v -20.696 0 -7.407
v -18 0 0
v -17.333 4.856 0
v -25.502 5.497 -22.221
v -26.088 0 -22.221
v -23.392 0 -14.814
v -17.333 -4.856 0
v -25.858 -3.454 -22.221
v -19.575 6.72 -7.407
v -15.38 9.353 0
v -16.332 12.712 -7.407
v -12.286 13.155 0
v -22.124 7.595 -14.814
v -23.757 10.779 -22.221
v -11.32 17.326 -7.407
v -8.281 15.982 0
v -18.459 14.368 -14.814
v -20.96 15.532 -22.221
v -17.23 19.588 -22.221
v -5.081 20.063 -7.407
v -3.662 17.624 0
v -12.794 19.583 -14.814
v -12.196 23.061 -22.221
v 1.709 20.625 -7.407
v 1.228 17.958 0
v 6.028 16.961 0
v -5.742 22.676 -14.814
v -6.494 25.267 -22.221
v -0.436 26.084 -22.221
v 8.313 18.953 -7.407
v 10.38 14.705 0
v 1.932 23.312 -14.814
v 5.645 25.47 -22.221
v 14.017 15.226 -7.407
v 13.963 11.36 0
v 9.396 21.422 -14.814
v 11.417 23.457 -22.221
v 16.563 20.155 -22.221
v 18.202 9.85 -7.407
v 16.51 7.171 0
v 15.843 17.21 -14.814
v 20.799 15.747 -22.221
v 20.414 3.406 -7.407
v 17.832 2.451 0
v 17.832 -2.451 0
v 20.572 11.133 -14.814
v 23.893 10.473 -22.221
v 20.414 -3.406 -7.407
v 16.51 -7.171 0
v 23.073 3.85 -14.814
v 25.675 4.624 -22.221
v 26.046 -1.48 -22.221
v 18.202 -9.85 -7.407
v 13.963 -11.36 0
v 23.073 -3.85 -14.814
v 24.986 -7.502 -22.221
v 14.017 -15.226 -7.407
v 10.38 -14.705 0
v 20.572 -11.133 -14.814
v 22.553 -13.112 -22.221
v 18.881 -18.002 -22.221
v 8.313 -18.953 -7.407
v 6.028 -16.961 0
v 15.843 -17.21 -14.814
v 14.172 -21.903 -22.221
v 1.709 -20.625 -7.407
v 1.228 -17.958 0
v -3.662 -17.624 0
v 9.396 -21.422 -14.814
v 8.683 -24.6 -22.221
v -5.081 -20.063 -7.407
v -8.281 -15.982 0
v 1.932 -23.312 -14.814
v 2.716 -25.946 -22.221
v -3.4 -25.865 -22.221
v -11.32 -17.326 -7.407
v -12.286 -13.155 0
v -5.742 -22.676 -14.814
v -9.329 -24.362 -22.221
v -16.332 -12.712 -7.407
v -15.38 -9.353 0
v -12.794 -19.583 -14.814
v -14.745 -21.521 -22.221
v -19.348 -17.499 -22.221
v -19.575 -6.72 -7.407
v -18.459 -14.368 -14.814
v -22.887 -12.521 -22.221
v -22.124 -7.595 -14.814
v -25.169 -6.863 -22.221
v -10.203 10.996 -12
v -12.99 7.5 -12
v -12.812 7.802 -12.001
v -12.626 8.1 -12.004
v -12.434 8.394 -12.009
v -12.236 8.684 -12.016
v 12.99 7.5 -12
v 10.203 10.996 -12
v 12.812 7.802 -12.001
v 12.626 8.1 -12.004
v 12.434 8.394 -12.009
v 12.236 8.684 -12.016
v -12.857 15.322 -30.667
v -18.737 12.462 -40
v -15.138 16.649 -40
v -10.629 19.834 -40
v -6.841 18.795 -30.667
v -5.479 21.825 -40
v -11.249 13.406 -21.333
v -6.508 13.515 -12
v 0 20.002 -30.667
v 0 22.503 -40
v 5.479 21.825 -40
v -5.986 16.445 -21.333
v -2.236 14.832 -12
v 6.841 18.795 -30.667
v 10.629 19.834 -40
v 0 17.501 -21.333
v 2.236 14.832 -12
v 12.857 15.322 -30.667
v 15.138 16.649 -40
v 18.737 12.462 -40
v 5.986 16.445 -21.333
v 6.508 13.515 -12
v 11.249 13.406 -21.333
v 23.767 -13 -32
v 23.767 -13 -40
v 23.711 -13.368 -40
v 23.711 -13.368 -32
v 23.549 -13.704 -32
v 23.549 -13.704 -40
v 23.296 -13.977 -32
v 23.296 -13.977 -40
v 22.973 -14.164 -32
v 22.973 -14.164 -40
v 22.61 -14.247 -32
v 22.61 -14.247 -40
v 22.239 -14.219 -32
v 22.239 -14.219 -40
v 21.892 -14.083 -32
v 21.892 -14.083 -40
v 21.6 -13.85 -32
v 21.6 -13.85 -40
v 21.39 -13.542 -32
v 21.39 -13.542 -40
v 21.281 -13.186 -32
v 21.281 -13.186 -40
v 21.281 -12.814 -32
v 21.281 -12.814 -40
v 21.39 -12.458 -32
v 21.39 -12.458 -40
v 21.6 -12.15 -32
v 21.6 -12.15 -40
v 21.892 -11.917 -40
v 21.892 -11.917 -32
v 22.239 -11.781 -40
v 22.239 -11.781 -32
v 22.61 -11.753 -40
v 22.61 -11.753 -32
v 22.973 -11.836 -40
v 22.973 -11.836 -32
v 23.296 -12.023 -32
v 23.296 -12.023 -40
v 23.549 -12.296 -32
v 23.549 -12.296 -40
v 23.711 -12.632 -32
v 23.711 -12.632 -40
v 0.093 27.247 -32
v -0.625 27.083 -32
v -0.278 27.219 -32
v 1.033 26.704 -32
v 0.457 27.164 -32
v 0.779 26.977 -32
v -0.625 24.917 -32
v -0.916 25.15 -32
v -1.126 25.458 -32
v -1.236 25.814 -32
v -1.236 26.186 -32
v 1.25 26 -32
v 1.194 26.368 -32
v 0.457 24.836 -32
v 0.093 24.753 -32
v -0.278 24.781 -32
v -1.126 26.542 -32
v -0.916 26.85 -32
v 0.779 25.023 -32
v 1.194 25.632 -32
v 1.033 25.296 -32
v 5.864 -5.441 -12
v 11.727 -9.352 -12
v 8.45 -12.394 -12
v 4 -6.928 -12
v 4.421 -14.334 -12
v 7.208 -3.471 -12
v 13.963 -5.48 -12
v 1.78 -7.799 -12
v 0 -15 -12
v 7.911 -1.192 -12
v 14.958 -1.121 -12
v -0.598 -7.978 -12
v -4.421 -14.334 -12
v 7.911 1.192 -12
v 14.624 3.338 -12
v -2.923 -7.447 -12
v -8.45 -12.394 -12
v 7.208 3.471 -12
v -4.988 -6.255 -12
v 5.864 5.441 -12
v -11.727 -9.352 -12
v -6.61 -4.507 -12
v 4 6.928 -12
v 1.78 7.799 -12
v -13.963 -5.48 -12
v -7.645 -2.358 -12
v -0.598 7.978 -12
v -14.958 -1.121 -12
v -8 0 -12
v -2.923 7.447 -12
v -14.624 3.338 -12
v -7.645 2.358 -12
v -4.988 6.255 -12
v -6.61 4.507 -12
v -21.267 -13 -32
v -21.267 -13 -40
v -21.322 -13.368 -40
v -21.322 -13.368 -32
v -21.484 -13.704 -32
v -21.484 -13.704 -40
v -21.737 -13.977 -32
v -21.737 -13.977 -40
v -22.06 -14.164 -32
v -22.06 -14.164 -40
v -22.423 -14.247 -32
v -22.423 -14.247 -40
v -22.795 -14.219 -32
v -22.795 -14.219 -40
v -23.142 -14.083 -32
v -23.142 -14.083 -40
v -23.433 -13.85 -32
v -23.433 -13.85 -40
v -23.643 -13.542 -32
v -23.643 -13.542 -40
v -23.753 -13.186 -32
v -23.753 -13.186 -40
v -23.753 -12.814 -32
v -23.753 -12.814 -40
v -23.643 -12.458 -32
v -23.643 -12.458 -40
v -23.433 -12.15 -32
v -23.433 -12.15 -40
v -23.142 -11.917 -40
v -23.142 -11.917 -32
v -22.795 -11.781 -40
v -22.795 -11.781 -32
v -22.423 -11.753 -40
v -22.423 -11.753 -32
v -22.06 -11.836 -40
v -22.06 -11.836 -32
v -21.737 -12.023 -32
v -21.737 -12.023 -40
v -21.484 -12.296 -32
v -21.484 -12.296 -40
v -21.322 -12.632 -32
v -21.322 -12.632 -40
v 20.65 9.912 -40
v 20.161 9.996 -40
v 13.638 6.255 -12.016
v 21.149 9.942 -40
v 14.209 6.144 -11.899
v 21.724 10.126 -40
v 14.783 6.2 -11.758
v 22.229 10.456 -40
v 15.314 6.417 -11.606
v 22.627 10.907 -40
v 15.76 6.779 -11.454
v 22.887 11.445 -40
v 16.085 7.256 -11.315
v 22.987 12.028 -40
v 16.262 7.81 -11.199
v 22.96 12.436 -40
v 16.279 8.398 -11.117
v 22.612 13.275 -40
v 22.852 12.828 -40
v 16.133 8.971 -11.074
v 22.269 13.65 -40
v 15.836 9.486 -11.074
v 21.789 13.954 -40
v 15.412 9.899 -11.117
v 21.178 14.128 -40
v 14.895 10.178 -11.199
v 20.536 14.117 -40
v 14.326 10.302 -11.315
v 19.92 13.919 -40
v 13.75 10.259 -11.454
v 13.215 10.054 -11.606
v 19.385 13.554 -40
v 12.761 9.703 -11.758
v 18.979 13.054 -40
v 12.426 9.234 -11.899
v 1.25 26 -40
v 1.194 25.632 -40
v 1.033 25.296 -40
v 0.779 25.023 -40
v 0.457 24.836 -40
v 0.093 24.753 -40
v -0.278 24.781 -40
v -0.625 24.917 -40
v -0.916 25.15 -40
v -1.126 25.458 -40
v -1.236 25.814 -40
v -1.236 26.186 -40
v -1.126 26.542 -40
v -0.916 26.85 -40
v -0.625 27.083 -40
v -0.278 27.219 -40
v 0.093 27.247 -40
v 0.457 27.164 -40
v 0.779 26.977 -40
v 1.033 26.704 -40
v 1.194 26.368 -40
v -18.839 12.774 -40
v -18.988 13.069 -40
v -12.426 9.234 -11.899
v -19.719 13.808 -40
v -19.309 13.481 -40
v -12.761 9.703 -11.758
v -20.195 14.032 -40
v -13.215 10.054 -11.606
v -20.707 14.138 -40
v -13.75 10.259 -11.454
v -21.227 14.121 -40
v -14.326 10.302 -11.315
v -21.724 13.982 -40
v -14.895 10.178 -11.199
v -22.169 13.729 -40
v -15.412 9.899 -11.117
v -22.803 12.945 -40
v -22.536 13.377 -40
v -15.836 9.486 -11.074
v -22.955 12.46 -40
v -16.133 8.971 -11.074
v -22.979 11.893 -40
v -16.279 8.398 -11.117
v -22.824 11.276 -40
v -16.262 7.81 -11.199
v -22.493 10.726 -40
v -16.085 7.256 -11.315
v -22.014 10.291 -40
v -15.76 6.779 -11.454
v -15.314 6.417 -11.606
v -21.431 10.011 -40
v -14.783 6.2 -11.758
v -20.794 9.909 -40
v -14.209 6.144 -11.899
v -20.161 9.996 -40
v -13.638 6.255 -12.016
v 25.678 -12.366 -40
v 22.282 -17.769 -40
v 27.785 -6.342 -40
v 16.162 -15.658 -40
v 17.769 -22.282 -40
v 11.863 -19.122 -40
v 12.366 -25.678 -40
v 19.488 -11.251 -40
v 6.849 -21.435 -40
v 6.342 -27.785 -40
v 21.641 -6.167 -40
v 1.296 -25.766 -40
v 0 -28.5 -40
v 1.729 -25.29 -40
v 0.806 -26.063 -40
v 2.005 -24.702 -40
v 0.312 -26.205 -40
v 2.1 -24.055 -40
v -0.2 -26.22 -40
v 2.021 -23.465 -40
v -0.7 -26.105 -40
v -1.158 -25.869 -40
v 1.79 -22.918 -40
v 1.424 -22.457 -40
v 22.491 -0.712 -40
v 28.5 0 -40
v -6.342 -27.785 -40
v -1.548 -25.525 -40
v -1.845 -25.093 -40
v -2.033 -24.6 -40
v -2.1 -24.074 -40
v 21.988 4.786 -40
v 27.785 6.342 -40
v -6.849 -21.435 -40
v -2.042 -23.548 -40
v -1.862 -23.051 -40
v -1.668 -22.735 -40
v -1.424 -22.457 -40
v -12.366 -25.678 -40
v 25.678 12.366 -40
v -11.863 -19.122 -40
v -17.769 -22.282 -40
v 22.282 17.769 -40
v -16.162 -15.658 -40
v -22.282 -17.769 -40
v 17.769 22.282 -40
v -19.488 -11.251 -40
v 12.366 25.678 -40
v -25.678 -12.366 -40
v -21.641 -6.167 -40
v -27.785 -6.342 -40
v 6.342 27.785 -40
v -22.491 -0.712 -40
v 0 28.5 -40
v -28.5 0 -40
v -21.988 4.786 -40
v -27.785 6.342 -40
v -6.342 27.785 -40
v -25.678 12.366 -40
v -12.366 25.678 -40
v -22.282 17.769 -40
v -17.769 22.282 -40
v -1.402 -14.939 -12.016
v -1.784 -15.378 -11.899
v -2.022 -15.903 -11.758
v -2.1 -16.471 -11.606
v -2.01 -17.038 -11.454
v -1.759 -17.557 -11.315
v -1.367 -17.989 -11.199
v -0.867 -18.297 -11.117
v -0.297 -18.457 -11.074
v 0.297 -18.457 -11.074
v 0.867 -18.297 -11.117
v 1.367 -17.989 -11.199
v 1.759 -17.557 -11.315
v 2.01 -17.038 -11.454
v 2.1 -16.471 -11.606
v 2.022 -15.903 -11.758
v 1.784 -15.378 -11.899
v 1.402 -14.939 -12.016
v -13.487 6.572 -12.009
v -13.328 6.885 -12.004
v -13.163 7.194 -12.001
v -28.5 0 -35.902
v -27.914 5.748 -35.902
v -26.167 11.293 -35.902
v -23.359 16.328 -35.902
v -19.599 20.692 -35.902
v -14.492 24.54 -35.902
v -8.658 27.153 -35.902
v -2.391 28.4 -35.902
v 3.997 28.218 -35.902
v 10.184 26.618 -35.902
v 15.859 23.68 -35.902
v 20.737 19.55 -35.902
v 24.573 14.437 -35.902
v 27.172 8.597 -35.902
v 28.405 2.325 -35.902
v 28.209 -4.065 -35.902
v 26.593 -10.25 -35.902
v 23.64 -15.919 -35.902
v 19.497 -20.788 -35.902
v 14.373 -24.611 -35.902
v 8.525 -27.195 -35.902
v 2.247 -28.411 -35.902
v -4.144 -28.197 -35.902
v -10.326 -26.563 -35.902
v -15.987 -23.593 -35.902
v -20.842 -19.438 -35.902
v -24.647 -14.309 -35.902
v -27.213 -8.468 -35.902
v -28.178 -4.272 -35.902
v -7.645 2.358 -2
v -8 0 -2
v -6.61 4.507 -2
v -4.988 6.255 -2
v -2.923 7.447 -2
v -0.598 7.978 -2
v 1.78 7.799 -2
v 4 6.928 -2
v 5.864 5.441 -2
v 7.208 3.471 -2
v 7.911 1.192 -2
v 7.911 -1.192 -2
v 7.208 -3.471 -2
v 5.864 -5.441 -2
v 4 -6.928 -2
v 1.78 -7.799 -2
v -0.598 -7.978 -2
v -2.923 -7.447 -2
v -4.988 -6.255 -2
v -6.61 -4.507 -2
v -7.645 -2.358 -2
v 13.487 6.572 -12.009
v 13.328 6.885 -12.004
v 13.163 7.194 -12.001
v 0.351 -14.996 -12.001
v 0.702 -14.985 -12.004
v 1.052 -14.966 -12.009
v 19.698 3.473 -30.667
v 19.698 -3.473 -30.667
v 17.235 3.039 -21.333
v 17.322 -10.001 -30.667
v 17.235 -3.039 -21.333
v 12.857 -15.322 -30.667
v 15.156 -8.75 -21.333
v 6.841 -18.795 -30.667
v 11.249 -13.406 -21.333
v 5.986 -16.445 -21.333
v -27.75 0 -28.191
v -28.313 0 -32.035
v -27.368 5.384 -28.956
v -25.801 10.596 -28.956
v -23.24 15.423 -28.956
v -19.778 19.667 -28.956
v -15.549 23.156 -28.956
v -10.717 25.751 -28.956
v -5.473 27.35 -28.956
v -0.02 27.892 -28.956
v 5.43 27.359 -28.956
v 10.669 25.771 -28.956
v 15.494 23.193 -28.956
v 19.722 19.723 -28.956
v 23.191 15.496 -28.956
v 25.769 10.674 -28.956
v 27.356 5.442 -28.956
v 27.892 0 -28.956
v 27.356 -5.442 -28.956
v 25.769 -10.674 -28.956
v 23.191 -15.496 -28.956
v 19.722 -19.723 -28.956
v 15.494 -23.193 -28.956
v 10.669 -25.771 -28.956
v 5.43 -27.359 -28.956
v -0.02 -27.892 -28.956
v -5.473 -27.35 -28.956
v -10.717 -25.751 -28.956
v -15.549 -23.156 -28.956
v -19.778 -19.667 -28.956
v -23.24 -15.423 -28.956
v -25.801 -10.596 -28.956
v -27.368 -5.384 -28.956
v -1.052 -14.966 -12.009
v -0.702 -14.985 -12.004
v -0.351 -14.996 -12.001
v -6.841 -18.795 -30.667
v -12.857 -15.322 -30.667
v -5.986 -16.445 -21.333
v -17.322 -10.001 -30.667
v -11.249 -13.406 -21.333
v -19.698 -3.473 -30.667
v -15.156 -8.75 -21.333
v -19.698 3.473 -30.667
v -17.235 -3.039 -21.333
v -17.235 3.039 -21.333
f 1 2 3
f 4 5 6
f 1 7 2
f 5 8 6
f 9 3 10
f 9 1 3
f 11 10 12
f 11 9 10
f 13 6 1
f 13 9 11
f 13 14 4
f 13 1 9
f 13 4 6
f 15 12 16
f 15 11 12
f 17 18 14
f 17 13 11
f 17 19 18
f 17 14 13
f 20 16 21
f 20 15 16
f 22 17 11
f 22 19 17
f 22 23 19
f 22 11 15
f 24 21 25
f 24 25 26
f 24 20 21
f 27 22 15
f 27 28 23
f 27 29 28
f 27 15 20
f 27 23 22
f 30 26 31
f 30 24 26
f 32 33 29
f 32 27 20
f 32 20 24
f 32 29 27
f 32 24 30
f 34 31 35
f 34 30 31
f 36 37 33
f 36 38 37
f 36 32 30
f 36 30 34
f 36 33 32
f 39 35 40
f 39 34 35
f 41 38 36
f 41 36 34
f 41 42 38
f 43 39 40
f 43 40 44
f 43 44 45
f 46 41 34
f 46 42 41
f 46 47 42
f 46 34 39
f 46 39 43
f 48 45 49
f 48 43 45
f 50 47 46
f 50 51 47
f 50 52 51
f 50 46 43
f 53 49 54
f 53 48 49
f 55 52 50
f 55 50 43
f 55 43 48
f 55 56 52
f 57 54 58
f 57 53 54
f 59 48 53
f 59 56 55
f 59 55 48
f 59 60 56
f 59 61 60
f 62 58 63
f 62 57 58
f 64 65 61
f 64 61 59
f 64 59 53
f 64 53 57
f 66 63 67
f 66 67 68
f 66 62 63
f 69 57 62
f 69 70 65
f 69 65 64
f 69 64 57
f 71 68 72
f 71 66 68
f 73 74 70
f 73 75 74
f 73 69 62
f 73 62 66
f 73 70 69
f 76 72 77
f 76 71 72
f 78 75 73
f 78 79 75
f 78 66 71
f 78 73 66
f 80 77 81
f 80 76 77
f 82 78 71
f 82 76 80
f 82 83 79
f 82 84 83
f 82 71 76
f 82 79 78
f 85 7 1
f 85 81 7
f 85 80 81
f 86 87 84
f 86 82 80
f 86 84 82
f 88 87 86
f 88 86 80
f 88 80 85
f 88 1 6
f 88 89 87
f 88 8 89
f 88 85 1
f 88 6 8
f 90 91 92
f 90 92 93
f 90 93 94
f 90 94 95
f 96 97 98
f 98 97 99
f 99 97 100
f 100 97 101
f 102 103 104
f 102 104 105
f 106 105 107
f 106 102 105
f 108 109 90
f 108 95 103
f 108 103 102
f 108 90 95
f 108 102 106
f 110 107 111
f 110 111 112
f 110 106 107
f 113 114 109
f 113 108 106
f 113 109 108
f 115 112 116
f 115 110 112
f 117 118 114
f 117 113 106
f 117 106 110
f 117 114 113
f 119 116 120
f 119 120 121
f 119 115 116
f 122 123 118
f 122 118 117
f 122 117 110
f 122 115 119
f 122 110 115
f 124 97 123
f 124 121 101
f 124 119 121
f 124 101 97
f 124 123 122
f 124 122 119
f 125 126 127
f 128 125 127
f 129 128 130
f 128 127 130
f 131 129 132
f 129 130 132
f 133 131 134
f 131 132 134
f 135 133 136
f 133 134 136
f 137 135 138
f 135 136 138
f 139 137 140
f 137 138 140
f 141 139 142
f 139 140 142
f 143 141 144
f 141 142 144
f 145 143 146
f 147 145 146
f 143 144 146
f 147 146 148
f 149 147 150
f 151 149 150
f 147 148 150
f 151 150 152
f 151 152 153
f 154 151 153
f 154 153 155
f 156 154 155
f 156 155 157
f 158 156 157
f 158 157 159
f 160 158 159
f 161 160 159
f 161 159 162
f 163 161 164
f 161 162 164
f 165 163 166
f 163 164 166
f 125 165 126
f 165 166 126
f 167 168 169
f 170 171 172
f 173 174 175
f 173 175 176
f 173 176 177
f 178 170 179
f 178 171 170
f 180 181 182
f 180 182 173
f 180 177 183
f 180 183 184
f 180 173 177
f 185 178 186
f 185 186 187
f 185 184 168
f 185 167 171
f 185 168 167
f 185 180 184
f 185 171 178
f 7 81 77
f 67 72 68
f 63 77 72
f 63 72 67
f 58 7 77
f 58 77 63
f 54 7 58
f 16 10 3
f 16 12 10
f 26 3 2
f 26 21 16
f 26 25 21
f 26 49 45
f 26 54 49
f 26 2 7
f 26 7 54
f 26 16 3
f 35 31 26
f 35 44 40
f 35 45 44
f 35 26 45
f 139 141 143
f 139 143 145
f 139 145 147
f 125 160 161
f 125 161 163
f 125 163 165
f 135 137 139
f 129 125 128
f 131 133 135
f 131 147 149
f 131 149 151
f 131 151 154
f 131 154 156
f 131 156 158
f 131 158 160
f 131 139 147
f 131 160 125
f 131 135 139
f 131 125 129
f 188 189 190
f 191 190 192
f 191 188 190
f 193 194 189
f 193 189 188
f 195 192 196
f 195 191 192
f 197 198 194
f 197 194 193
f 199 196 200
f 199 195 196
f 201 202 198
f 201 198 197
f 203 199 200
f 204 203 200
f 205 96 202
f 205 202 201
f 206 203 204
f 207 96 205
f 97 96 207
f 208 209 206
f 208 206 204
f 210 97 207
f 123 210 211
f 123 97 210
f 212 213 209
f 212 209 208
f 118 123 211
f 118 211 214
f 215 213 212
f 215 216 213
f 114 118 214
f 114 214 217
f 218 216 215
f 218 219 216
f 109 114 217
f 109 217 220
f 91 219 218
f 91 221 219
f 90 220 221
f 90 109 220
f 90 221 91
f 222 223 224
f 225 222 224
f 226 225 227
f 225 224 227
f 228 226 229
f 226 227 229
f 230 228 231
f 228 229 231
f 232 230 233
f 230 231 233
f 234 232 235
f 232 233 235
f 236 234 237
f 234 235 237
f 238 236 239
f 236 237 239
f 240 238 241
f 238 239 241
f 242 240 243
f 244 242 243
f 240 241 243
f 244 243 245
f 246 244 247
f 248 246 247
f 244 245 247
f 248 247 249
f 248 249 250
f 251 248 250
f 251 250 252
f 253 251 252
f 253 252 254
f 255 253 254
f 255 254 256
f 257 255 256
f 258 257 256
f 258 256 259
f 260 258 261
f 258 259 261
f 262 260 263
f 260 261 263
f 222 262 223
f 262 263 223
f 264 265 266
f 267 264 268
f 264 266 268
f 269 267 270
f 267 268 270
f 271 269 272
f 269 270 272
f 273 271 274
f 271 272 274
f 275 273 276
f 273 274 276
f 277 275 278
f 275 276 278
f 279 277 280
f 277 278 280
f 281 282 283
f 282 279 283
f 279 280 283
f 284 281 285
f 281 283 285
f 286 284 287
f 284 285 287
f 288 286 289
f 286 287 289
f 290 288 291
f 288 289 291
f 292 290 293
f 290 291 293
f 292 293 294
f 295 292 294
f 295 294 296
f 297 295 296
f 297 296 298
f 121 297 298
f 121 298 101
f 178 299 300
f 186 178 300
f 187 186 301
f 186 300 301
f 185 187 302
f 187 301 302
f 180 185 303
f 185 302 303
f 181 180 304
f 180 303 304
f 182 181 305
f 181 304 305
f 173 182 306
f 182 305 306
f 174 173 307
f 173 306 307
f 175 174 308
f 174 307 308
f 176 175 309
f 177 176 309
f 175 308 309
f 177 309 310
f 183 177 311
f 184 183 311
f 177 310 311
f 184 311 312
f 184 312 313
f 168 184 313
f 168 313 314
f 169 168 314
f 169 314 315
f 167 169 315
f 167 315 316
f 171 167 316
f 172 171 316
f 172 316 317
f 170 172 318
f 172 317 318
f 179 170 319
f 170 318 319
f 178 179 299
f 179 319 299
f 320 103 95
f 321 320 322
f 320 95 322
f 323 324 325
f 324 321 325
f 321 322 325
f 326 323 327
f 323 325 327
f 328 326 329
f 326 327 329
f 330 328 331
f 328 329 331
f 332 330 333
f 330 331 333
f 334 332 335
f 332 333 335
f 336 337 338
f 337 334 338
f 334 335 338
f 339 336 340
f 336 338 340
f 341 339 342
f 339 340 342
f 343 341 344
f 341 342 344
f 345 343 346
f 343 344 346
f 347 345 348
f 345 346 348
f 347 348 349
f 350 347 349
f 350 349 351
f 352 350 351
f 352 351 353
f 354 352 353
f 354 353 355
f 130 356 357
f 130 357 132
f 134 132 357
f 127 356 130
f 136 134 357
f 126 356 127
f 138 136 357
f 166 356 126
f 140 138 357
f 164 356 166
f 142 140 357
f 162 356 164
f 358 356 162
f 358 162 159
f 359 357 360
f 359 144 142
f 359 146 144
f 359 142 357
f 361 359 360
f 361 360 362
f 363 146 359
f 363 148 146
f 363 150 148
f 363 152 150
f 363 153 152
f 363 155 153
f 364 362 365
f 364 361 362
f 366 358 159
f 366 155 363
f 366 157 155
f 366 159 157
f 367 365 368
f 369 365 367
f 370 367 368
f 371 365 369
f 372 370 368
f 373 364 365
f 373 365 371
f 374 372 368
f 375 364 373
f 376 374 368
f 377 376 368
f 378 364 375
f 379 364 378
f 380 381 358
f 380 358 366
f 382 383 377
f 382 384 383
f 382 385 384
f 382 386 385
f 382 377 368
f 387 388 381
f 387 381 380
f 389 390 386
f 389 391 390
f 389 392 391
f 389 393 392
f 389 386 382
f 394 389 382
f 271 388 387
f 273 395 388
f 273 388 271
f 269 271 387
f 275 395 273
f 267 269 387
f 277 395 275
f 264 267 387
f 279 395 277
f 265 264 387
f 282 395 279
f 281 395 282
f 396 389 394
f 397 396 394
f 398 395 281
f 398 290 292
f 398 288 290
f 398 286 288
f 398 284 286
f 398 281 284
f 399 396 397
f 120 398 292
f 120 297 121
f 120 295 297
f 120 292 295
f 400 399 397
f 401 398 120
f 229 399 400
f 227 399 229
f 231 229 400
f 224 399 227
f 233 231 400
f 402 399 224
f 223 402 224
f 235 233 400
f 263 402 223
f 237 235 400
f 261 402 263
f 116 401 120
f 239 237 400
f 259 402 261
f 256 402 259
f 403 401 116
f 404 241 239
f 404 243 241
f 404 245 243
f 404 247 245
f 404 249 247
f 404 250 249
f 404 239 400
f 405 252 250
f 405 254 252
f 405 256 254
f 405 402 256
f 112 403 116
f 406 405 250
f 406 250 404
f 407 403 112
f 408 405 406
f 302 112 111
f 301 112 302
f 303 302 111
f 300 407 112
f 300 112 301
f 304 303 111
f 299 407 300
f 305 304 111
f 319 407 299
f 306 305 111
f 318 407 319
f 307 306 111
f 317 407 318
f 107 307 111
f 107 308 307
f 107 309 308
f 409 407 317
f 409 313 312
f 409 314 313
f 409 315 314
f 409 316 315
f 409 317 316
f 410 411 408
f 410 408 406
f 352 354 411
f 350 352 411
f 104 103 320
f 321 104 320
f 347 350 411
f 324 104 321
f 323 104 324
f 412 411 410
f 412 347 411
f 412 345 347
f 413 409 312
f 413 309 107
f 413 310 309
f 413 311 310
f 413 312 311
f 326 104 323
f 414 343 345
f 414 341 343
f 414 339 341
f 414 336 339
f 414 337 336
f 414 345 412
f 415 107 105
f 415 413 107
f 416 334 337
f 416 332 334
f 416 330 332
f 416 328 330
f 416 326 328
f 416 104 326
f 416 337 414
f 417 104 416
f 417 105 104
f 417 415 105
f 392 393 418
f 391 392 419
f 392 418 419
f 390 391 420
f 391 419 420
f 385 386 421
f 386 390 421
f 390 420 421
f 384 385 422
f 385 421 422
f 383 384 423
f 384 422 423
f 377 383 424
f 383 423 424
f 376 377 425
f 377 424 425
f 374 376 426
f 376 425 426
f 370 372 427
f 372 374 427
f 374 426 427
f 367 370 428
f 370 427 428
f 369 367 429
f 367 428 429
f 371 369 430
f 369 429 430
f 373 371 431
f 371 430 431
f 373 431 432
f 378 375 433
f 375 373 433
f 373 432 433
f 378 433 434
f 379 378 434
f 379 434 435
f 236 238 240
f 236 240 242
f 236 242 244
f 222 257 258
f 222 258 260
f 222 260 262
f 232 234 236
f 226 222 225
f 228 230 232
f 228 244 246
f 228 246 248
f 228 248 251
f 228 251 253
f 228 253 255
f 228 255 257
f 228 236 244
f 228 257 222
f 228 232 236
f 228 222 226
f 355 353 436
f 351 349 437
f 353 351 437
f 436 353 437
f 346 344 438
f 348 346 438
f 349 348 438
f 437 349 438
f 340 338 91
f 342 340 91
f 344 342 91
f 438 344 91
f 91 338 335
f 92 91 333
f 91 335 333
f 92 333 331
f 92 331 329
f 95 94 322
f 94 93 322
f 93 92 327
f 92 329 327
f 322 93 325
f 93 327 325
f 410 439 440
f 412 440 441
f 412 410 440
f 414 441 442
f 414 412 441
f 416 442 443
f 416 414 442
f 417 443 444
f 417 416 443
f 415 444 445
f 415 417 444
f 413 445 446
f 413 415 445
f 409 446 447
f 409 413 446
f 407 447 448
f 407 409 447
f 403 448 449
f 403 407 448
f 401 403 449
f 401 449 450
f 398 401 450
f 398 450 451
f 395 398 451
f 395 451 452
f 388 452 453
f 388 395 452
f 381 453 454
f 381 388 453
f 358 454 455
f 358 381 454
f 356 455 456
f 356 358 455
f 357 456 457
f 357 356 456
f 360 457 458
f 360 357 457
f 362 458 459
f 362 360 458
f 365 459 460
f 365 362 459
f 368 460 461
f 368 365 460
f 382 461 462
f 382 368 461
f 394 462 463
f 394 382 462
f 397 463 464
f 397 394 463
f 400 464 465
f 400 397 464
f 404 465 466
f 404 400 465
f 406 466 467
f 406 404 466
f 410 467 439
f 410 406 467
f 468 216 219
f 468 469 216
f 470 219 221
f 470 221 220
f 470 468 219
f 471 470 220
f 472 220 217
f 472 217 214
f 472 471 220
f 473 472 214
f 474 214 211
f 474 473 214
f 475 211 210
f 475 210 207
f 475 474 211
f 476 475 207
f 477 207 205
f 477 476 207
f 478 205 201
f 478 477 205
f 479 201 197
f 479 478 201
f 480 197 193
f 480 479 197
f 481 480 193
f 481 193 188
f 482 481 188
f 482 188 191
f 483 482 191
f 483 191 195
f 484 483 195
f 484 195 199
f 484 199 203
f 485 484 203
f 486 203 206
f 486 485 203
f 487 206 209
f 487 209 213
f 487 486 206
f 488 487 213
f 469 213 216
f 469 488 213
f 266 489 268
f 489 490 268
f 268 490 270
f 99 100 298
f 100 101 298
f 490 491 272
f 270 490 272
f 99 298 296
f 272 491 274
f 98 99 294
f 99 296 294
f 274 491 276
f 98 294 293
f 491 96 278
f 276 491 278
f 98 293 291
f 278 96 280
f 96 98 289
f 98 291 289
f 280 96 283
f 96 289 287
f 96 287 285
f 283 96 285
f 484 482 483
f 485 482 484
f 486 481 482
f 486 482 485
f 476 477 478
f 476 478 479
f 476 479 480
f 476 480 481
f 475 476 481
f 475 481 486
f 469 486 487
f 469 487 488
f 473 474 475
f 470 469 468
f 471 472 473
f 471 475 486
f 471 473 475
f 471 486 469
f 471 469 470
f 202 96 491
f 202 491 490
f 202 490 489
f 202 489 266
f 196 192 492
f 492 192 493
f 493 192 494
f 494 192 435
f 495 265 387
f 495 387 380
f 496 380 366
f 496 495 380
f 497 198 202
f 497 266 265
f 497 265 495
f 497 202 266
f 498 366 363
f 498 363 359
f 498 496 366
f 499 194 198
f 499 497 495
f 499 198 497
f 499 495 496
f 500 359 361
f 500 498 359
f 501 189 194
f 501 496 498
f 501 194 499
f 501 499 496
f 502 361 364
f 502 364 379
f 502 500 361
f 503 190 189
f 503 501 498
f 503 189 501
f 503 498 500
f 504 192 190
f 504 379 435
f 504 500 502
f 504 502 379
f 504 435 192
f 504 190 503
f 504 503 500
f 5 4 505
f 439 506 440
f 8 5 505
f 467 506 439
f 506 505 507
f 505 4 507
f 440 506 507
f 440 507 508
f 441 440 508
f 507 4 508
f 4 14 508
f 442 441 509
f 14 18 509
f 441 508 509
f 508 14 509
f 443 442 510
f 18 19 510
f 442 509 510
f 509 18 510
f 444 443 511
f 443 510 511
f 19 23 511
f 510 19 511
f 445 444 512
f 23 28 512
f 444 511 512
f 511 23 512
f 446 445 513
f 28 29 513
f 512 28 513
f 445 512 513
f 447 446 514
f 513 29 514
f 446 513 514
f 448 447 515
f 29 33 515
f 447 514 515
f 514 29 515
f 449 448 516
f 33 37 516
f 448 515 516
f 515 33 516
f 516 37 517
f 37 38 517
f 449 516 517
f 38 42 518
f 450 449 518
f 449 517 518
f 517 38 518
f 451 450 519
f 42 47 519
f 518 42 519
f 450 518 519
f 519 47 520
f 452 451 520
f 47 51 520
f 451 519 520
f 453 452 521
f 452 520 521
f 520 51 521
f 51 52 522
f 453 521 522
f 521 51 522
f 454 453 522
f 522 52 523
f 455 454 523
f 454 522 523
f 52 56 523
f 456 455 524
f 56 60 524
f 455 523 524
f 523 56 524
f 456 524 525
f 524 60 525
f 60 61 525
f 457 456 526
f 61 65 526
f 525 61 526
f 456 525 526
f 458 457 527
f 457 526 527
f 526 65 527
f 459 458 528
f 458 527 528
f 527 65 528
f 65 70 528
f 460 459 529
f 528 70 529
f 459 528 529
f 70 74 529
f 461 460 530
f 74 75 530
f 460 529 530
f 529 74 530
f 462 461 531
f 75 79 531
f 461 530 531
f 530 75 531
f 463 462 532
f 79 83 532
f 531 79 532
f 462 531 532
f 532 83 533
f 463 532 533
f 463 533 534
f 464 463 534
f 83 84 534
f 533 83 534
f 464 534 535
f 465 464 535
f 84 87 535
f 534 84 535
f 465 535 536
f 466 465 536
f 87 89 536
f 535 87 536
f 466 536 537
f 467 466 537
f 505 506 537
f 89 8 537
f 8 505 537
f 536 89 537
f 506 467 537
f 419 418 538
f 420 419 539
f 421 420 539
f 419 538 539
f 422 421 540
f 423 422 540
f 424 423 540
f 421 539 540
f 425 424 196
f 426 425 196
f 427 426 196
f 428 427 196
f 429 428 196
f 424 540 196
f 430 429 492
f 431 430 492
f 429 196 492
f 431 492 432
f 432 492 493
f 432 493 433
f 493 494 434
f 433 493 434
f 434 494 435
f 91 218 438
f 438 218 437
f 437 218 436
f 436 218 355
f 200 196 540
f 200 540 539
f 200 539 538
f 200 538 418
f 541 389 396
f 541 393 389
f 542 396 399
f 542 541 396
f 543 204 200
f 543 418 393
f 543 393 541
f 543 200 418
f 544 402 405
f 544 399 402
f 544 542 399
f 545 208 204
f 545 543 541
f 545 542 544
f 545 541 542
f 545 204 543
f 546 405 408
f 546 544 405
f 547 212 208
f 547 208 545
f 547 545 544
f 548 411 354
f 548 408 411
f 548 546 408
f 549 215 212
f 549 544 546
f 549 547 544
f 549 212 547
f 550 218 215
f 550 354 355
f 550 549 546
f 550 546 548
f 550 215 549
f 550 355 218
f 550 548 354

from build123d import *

# Parameters (mm, degrees)
F5_R      = 2.1
F6_DEPTH  = 30
F8_R      = 2.1
F9_DEPTH  = 30
F11_R     = 2.1
F12_DEPTH = 30
F13_R     = 1.25
F14_DEPTH = 8
F15_R     = 40


with BuildPart() as f1:
    # F0 (on Front) → F1 (revolve)
    with BuildSketch(Plane.XZ):
        Polygon((0, -2), (0, 0), (-18, 0), (-28.5, -28.8485129043), (-28.5, -40), (-22.5025773881, -40), (-15, -12), (-8, -12), (-8, -2), align=None)
    revolve(axis=Axis((0, 0, -1), (0, 0, -1)))

    # F5 (on face) → F6 (cut)
    with BuildSketch(Plane(origin=(0, -4.0048094716, -14.9461524227), x_dir=(1, 0, 0), z_dir=(0, 0.2588190451, 0.9659258263))):
        with Locations((0, -12.8830588531)):
            Circle(F5_R)
    extrude(amount=-F6_DEPTH, mode=Mode.SUBTRACT)

    # F8 (on face) → F9 (cut)
    with BuildSketch(Plane(origin=(-3.4682667397, 2.0024047358, -14.9461524227), x_dir=(0.9745560663, 0.0297636554, -0.2221589485), z_dir=(0.224143868, -0.1294095226, 0.9659258263))):
        with Locations((-11.0582542606, 6.6097063567)):
            Circle(F8_R)
    extrude(amount=-F9_DEPTH, mode=Mode.SUBTRACT)

    # F11 (on face) → F12 (cut)
    with BuildSketch(Plane(origin=(3.4682667397, 2.0024047358, -14.9461524227), x_dir=(0.9745560663, -0.0297636554, 0.2221589485), z_dir=(-0.224143868, -0.1294095226, 0.9659258263))):
        with Locations((11.0582542586, 6.6097063599)):
            Circle(F11_R)
    extrude(amount=-F12_DEPTH, mode=Mode.SUBTRACT)

    # F13 (on face) → F14 (cut)
    with BuildSketch(Plane(origin=(0, 0, -40), x_dir=(1, 0, 0), z_dir=(0, 0, -1))):
        with Locations((-22.5166604984, 13)):
            Circle(F13_R)
        with Locations((22.5166604984, 13)):
            Circle(F13_R)
        with Locations((0, -26)):
            Circle(F13_R)
    extrude(amount=-F14_DEPTH, mode=Mode.SUBTRACT)

    # F15
    f15_edges = [f1.edges().sort_by_distance(p)[0] for p in [
        (28.5, 0, -28.848513),
    ]]
    fillet(f15_edges, radius=F15_R)


solid = f1.part
